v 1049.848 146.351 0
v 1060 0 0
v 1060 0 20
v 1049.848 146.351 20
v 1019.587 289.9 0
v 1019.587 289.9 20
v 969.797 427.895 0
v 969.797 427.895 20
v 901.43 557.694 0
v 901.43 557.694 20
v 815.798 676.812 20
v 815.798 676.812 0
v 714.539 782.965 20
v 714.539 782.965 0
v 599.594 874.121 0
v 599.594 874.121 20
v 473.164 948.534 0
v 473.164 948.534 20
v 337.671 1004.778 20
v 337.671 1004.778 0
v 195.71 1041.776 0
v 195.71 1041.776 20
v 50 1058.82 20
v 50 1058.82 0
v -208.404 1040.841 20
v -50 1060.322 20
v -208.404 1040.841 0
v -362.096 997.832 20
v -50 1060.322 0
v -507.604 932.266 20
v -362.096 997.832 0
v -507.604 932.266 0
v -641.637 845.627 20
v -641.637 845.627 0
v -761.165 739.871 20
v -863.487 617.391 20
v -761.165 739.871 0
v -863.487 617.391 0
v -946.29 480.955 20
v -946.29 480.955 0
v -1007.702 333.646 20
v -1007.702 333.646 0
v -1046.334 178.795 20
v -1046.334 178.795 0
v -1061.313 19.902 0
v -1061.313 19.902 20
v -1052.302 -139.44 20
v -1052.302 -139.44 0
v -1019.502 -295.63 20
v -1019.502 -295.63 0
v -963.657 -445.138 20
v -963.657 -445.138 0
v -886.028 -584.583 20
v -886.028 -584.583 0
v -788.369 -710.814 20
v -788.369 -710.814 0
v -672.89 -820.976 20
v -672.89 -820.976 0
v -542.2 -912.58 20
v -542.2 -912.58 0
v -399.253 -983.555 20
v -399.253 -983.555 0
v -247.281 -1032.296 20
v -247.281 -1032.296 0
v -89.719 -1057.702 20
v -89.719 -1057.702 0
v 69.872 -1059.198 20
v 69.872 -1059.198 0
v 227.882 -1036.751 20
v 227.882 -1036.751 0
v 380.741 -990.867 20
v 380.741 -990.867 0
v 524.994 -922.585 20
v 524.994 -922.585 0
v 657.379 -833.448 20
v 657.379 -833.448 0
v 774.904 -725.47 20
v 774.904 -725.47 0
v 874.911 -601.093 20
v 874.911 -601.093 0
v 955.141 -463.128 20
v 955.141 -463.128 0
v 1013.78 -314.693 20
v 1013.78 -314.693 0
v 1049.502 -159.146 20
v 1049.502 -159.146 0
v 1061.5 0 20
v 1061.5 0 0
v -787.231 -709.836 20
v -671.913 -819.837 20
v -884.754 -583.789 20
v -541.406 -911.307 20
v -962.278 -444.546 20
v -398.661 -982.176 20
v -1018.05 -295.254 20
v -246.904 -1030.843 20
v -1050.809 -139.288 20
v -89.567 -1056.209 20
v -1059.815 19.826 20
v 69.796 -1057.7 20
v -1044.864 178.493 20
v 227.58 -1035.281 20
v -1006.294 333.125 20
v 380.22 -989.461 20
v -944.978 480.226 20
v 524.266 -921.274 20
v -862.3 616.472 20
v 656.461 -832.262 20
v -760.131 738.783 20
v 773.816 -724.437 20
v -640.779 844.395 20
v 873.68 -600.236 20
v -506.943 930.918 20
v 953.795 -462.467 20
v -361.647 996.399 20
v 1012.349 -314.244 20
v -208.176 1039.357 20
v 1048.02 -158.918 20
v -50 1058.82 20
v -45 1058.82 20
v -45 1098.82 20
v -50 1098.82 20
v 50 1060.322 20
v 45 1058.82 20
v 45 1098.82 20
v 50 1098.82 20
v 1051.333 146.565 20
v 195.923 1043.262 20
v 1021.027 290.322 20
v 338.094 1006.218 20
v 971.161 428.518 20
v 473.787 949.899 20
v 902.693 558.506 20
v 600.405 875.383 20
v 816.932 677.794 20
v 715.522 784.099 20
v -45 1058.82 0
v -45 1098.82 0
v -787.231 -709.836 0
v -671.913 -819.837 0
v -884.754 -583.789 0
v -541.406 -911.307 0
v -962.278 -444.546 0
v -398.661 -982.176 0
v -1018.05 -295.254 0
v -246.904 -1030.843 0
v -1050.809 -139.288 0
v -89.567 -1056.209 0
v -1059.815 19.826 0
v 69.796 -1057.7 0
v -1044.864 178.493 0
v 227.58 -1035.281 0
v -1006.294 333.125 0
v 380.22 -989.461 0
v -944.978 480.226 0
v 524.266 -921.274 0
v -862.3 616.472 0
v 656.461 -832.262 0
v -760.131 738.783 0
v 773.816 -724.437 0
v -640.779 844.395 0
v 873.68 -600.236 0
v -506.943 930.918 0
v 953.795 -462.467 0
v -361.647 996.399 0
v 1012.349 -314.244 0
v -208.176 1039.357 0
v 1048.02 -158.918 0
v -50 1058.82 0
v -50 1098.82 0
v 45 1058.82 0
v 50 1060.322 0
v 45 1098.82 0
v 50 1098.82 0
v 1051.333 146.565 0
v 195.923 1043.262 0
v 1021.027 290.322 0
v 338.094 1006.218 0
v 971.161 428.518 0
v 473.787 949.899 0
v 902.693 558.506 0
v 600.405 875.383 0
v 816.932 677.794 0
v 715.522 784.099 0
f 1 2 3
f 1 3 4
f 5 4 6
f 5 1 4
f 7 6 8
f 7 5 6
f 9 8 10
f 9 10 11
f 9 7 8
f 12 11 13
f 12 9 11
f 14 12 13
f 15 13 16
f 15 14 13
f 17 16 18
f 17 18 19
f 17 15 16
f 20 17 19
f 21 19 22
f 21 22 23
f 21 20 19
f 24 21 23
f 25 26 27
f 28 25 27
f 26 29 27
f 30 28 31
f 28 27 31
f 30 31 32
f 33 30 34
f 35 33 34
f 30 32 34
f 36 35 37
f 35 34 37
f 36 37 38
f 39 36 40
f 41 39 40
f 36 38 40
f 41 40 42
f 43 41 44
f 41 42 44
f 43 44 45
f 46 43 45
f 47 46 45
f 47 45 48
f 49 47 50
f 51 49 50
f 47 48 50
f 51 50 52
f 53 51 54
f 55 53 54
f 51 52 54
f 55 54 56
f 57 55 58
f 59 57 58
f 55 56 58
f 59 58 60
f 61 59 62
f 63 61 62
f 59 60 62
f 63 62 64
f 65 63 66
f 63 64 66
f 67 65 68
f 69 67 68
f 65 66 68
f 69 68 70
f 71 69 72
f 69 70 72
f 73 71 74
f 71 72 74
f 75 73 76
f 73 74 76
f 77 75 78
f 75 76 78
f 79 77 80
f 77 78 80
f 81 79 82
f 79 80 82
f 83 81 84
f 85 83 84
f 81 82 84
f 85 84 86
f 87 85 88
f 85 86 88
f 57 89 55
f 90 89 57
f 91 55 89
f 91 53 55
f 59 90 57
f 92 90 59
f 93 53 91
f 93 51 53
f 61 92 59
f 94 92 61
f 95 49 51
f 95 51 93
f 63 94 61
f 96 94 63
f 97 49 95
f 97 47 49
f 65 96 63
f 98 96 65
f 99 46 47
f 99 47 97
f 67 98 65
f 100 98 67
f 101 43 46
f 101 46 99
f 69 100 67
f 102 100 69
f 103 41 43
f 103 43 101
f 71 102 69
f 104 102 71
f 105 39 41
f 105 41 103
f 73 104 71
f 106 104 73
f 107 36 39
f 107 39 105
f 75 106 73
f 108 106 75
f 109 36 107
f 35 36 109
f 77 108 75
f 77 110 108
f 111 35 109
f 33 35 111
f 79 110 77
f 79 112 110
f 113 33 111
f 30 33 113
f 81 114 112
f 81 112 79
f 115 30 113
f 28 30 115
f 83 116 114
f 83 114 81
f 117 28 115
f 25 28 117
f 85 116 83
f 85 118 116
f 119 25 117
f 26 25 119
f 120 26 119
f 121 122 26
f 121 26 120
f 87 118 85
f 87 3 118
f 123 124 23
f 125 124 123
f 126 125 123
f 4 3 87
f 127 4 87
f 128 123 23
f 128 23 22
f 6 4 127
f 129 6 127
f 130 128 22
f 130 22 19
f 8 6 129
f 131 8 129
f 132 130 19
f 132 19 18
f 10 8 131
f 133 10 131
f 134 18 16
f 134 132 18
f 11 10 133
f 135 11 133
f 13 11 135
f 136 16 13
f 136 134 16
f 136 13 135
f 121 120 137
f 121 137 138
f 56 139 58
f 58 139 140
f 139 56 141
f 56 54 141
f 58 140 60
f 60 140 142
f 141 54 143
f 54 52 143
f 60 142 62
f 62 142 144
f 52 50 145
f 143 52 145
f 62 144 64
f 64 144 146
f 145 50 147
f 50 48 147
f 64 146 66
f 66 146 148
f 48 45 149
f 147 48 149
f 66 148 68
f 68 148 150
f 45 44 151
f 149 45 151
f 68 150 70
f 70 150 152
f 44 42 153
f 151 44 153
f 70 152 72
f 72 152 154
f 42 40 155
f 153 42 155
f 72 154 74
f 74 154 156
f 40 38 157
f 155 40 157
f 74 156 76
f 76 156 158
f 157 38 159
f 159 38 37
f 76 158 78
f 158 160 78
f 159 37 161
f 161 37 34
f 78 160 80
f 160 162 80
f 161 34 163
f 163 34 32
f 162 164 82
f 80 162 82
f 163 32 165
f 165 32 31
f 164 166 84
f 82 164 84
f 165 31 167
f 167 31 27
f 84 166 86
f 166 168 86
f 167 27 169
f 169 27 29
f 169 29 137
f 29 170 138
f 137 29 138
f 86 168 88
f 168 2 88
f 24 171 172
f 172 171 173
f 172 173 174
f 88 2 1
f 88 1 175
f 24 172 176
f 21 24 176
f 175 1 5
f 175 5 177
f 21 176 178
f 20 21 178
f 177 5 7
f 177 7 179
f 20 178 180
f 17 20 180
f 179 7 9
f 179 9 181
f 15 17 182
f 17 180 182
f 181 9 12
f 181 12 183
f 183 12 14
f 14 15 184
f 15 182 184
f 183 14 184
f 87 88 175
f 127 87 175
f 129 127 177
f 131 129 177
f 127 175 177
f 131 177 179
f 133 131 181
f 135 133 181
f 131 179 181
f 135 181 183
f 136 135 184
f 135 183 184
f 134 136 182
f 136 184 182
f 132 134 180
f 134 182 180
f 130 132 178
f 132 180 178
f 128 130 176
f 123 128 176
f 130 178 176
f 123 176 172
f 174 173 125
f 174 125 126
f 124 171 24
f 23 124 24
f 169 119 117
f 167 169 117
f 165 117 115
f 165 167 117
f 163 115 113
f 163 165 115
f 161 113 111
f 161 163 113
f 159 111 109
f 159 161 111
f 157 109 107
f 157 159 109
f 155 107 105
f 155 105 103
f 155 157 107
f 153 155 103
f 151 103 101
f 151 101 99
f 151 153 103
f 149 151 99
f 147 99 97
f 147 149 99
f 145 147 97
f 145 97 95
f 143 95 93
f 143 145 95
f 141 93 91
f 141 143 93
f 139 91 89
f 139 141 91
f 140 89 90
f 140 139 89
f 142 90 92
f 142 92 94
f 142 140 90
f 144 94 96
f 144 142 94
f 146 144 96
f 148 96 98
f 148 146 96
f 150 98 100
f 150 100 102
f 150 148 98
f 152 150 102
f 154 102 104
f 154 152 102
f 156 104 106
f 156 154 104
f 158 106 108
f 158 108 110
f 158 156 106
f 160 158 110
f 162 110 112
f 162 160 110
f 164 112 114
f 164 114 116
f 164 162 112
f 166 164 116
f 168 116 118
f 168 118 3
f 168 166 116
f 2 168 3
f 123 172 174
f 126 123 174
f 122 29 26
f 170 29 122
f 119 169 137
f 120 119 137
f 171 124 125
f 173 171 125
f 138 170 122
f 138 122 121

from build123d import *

# Parameters (mm, degrees)
SKETCH1_R           = 1061.5
SKETCH1_R_2         = 1060
BOSS_EXTRUDE1_DEPTH = 20
SKETCH2_W           = 100
SKETCH2_H           = 40
BOSS_EXTRUDE2_DEPTH = 20
SKETCH3_W           = 90
SKETCH3_H           = 856.926070381
CUT_EXTRUDE1_DEPTH  = 40


with BuildPart() as part:
    # Sketch1 → Boss-Extrude1 (new body)
    with BuildSketch(Plane.XY):
        Circle(SKETCH1_R)
        Circle(SKETCH1_R_2, mode=Mode.SUBTRACT)
    extrude(amount=BOSS_EXTRUDE1_DEPTH)

    # Sketch2 → Boss-Extrude2 (add)
    with BuildSketch(Plane.XY):
        with Locations((0, 1078.820098034)):
            Rectangle(SKETCH2_W, SKETCH2_H)
    extrude(amount=BOSS_EXTRUDE2_DEPTH)

    # Sketch3 → Cut-Extrude1 (cut)
    with BuildSketch(Plane.XY.offset(20)):
        with Locations((0, 1370.93039413)):
            Rectangle(SKETCH3_W, SKETCH3_H)
    extrude(amount=-CUT_EXTRUDE1_DEPTH, mode=Mode.SUBTRACT)


solid = part.part
